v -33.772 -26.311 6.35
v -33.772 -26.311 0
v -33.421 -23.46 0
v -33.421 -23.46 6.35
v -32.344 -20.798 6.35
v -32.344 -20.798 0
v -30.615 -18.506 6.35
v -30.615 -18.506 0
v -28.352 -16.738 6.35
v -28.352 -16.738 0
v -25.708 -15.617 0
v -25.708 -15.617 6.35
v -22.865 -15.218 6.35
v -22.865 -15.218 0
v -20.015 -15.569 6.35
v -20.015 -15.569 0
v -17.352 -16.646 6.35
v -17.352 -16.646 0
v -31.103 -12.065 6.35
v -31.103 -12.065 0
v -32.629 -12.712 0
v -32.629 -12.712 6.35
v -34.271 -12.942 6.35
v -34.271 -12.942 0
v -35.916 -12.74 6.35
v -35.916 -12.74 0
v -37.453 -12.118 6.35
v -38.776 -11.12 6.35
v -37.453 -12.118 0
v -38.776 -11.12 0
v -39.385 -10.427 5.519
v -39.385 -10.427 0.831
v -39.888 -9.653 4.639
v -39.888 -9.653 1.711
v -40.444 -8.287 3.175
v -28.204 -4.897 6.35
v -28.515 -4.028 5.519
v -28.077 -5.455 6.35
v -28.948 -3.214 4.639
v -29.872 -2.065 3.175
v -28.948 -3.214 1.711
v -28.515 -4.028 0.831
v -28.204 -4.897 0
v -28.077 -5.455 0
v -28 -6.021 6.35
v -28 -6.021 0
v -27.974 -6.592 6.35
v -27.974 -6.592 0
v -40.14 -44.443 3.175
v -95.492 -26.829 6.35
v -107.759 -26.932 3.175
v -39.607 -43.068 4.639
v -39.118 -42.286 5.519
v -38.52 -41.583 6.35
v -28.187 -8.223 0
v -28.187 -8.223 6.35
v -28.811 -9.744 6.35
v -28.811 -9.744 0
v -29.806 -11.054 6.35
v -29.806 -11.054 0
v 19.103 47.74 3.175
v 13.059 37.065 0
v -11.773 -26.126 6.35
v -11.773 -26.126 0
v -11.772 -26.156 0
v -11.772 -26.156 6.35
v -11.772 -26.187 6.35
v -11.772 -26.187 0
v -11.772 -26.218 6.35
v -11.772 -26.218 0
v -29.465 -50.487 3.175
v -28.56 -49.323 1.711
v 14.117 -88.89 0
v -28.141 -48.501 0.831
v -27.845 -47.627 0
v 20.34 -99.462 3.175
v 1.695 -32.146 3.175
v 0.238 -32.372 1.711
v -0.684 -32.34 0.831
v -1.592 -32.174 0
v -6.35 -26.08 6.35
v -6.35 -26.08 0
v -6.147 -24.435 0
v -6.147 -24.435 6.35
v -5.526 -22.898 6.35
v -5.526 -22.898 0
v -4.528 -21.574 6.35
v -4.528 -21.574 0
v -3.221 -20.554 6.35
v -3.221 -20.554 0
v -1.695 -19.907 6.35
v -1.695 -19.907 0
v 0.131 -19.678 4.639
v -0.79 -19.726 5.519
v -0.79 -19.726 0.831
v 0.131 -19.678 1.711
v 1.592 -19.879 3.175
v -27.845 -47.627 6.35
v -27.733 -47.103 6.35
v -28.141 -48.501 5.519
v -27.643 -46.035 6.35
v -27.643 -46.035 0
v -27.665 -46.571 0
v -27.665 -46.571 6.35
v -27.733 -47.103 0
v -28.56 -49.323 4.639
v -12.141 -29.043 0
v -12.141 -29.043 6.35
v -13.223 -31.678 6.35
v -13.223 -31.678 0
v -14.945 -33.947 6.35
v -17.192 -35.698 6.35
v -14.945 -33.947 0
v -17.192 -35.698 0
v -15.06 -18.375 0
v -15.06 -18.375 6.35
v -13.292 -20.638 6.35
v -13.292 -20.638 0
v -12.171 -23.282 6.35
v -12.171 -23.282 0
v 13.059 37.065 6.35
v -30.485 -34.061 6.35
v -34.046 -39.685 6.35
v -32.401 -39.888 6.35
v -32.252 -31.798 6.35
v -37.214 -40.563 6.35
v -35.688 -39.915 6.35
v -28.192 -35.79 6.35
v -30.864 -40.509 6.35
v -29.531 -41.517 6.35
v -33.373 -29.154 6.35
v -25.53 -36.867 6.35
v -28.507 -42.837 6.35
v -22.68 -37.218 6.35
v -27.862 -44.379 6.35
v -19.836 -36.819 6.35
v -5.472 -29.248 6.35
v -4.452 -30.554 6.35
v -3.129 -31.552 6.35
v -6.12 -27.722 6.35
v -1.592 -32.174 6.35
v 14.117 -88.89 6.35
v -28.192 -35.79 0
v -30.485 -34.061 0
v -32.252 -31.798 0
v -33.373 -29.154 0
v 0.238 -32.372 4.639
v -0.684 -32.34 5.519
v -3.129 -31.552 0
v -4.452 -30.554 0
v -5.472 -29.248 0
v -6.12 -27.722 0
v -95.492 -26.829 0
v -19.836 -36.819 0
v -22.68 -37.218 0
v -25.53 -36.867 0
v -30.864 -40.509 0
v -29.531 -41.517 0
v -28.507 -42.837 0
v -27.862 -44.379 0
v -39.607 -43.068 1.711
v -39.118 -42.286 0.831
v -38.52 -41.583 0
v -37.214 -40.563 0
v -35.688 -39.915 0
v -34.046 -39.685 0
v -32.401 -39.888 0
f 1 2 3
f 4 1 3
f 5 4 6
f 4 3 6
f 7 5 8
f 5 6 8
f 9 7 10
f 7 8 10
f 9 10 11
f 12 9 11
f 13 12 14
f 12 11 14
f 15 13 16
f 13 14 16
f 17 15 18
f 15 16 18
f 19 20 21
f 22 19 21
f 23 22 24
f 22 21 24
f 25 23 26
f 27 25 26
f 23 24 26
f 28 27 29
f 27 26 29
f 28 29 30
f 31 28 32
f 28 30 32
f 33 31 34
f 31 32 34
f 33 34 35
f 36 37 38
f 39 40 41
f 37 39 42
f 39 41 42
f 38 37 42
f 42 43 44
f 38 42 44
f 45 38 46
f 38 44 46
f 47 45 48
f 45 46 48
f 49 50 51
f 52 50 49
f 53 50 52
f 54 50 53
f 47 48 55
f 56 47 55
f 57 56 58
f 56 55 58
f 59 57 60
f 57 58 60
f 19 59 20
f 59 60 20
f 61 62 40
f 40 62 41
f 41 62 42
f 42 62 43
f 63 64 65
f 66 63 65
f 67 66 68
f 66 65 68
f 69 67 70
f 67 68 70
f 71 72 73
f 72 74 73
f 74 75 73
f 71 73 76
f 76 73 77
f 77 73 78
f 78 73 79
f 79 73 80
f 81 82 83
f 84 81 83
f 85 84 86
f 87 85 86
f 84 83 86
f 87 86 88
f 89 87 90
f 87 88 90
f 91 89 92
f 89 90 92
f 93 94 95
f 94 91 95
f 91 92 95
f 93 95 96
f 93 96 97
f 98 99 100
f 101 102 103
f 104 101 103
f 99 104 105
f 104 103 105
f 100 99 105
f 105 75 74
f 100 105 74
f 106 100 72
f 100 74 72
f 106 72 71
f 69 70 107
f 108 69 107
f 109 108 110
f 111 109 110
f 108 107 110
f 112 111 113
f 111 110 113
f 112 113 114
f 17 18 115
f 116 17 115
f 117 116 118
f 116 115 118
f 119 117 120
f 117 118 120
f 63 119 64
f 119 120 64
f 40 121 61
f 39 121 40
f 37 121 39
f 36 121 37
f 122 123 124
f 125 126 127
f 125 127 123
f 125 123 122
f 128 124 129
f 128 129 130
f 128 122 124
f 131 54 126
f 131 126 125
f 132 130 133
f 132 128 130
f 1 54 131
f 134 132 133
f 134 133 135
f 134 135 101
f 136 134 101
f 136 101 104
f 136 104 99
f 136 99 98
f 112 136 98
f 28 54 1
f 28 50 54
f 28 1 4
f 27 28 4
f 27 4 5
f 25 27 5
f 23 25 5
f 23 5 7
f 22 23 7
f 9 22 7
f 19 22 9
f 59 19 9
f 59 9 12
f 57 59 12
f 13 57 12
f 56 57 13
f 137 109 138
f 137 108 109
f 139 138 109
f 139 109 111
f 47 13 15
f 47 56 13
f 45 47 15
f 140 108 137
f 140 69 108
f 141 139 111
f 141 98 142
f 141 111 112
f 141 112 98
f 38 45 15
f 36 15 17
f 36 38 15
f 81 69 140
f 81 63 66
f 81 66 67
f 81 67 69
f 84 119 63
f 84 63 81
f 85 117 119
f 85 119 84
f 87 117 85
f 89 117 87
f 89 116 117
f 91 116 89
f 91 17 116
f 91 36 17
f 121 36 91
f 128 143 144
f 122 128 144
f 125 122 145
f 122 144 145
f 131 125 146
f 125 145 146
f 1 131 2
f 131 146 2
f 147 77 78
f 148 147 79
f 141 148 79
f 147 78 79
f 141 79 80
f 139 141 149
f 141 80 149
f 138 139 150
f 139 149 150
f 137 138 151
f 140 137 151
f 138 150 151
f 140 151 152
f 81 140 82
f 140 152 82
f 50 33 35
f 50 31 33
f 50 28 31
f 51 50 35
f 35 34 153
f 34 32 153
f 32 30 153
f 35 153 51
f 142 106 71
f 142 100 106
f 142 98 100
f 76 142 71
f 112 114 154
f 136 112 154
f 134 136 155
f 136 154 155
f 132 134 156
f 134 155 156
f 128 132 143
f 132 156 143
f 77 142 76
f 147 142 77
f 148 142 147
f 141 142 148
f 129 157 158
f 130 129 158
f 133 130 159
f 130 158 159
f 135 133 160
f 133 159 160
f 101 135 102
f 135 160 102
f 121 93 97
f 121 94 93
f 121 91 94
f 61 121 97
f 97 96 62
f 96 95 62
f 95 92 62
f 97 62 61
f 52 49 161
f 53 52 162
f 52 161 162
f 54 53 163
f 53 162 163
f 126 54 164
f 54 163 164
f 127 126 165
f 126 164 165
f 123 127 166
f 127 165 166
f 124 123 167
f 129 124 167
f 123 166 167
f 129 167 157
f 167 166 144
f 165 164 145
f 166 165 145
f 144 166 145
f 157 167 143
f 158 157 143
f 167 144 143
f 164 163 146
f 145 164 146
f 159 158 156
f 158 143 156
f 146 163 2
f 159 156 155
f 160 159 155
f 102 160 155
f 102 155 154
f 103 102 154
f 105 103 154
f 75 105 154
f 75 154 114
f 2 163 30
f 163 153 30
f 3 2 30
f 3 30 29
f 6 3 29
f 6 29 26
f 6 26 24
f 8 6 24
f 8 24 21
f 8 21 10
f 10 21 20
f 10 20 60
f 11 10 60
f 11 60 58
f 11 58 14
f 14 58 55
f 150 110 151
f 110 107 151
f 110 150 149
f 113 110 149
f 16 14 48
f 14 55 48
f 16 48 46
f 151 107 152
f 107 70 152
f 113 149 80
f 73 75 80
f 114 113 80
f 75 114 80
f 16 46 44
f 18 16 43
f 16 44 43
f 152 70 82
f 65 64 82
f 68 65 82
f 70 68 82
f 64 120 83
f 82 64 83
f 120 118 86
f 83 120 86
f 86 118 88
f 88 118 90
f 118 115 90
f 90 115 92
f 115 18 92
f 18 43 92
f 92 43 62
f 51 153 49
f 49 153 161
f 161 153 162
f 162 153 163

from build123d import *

# Parameters (mm, degrees)
F1_DEPTH = 6.35
F2_SIZE  = 3.17499


# Not quite as in the source:
# - a fillet or chamfer is up to 0.001 mm smaller than in the source, because OpenCascade refuses the exact size


with BuildPart() as f1:
    # F0 (on Top) → F1 (new body)
    with BuildSketch(Plane.XY):
        with BuildLine():
            Line((-17.3524573698, -16.6459077914), (19.1028173324, 47.7399711053))
            Line((19.1028173324, 47.7399711053), (-29.8718068032, -2.0647344031))
            ThreePointArc((-29.8718068032, -2.0647344031), (-28.46767213, -4.137767395), (-27.974045361, -6.5924349039))
            ThreePointArc((-27.974045361, -6.5924349039), (-28.8114925566, -9.7443012682), (-31.1029466457, -12.0648222317))
            Line((-31.1029466457, -12.0648222317), (-28.352068997, -16.7383418336))
            ThreePointArc((-28.352068997, -16.7383418336), (-22.8646469969, -15.2184562862), (-17.3524573698, -16.6459077914))
        make_face()
        with BuildLine():
            ThreePointArc((-31.1029466457, -12.0648222317), (-36.70470147, -12.4792826589), (-40.4436473061, -8.2874192794))
            Line((-40.4436473061, -8.2874192794), (-107.7592687025, -26.9322474098))
            Line((-107.7592687025, -26.9322474098), (-33.7718245819, -26.3105019555))
            ThreePointArc((-33.7718245819, -26.3105019555), (-32.3443730767, -20.7983123285), (-28.352068997, -16.7383418336))
            Line((-28.352068997, -16.7383418336), (-31.1029466457, -12.0648222317))
        make_face()
        with BuildLine():
            Line((-33.7718245819, -26.3105019555), (-107.7592687025, -26.9322474098))
            Line((-107.7592687025, -26.9322474098), (-40.1398164365, -44.4431632978))
            ThreePointArc((-40.1398164365, -44.4431632978), (-36.4718453922, -40.1890566965), (-30.8639164155, -40.5093177627))
            Line((-30.8639164155, -40.5093177627), (-28.1919685396, -35.7902280353))
            ThreePointArc((-28.1919685396, -35.7902280353), (-32.2519390345, -31.7979239556), (-33.7718245819, -26.3105019555))
        make_face()
        with BuildLine():
            Line((20.339812506, -99.4619274356), (-17.1923569125, -35.6977939932))
            ThreePointArc((-17.1923569125, -35.6977939932), (-22.6797789126, -37.2176795405), (-28.1919685396, -35.7902280353))
            Line((-28.1919685396, -35.7902280353), (-30.8639164155, -40.5093177627))
            ThreePointArc((-30.8639164155, -40.5093177627), (-28.5067207601, -42.8369871561), (-27.6425935032, -46.0350647422))
            ThreePointArc((-27.6425935032, -46.0350647422), (-28.1158002373, -48.440433926), (-29.4648930024, -50.4873033))
            Line((-29.4648930024, -50.4873033), (20.339812506, -99.4619274356))
        make_face()
        with BuildLine():
            ThreePointArc((1.6949843755, -32.1463060392), (-3.8231655338, -31.0968032352), (-6.3497758029, -26.0800637457))
            Line((-6.3497758029, -26.0800637457), (-11.7726013276, -26.1256338712))
            ThreePointArc((-11.7726013276, -26.1256338712), (-11.7723100484, -26.1718504844), (-11.7722129547, -26.2180679134))
            ThreePointArc((-11.7722129547, -26.2180679134), (-13.2229088841, -31.6779938989), (-17.1923569125, -35.6977939932))
            Line((-17.1923569125, -35.6977939932), (20.339812506, -99.4619274356))
            Line((20.339812506, -99.4619274356), (1.6949843755, -32.1463060392))
        make_face()
        with BuildLine():
            Line((1.5919014444, -19.8794811608), (19.1028173324, 47.7399711053))
            Line((19.1028173324, 47.7399711053), (-17.3524573698, -16.6459077914))
            ThreePointArc((-17.3524573698, -16.6459077914), (-13.2924868749, -20.6382118711), (-11.7726013276, -26.1256338712))
            Line((-11.7726013276, -26.1256338712), (-6.3497758029, -26.0800637457))
            ThreePointArc((-6.3497758029, -26.0800637457), (-3.9078316495, -21.0215715485), (1.5919014444, -19.8794811608))
        make_face()
    extrude(amount=F1_DEPTH)

    # F2 (size 3.175 in the source; OpenCascade refuses exactly that, so slightly less here)
    f2_edges = [f1.edges().sort_by_distance(p)[0] for p in [
        (-74.101458, -17.609833, 6.35),
        (-73.949543, -35.687705, 6.35),
        (-73.949543, -35.687705, 0),
        (-4.56254, -74.974615, 6.35),
        (11.017398, -65.804117, 6.35),
        (-5.384495, 22.837618, 6.35),
        (-74.101458, -17.609833, 0),
        (-4.56254, -74.974615, 0),
        (11.017398, -65.804117, 0),
        (-5.384495, 22.837618, 0),
        (10.347359, 13.930245, 0),
        (10.347359, 13.930245, 6.35),
    ]]
    chamfer(f2_edges, length=F2_SIZE)


solid = f1.part
